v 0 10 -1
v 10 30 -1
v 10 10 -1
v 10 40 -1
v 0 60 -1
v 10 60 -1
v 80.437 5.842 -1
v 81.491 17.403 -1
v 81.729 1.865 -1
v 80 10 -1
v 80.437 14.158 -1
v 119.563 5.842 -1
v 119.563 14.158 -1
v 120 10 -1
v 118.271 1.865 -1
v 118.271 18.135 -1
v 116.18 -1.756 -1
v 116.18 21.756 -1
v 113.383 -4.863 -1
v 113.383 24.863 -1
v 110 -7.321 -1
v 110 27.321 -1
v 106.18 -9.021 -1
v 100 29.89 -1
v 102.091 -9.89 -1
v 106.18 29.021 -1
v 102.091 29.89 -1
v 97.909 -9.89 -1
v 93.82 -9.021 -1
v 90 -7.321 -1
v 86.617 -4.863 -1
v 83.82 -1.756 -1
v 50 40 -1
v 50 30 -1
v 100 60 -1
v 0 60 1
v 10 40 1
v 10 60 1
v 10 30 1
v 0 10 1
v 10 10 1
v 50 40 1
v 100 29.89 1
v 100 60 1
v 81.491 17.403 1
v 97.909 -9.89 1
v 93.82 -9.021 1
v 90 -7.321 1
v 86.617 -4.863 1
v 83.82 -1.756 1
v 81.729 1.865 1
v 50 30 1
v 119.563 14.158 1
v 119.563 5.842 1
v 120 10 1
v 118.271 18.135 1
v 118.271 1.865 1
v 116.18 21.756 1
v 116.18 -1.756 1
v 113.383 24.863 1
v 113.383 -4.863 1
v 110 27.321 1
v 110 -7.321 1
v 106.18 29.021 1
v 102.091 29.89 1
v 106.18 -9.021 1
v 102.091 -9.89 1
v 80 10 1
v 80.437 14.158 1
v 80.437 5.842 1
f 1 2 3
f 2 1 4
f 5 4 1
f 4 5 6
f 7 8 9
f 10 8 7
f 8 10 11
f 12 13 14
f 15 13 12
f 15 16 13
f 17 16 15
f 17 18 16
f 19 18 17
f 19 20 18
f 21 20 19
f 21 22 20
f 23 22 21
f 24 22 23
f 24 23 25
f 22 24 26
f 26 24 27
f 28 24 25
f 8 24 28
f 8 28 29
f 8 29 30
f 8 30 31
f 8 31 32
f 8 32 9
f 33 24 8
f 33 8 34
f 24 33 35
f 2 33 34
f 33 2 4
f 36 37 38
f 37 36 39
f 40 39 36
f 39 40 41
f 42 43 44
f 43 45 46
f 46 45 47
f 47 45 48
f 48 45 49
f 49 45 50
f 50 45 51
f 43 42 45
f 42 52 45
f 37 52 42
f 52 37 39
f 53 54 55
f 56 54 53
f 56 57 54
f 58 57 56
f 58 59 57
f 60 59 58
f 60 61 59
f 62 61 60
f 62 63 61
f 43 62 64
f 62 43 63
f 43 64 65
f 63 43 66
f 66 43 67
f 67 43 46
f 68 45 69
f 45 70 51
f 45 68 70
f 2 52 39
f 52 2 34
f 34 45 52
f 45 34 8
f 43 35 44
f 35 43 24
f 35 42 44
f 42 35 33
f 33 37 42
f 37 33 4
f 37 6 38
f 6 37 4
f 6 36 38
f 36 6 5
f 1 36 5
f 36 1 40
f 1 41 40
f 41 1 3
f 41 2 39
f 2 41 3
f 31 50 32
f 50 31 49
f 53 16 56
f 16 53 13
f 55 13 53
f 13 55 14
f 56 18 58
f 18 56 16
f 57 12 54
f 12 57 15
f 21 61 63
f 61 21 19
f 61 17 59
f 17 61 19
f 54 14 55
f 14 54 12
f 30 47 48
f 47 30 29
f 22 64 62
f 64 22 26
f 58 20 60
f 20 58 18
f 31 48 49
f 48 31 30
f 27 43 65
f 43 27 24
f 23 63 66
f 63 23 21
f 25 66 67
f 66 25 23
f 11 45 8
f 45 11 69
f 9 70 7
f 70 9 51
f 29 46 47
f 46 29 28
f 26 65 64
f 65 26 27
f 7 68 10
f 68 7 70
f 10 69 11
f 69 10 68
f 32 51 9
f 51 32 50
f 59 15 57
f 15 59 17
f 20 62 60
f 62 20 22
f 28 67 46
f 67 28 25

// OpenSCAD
shape = true;
liquid = true;
stiel = true;

zitroneSchale = true;
zitroneInhalt = true;

module glas() {
    polygon(points=[[0,10],[10,10],[10,30],[50,30],[100,10],[100,60],[50,40],[10,40],[10,60],[0,60]]);
};
module glasInhalt() {
    polygon(points=[[50,37],[50,33],[95,15],[95,55]]);
};

module stielInhalt() {
    polygon(points=[[50,37],[50,33],[7,33],[7,57],[2,57],[2,13],[2,57],[2,13],[7,13],[7,37]]);
};


module zitroneInhalt() {

    difference() {
        color("white") cylinder(r=15, h= 2);
    }
};
    
module zitroneSchale() {

    color("yellow") difference() {
        cylinder(r=20, h= 2);
        zitroneInhalt();
    }
}

module liquid() {
    color("red")linear_extrude(height = 2, center = true, convexity = 10, twist = 0) glasInhalt();
}

module stiel() {
    color("white")linear_extrude(height = 2, center = true, convexity = 10, twist = 0) stielInhalt();
}

module shape() {
    color("lightblue") difference() {
        linear_extrude(height = 2, center = true, convexity = 10, twist = 0) glas();
        linear_extrude(height = 2, center = true, convexity = 10, twist = 0) glasInhalt();
        linear_extrude(height = 2, center = true, convexity = 10, twist = 0) stielInhalt();
    }
}

module cocktail() {
    translate([0,0,1])
    union() {
        liquid();
        stiel();
        shape();
    }
}

if (shape) shape();
if (liquid) liquid();
if (stiel) stiel();

//if (zitroneSchale) translate([100,10,-1]) zitroneSchale(); 
//if (zitroneInhalt) translate([100,10,-1]) zitroneInhalt();
    


if (zitroneSchale) difference() {translate([100,10,-1]) zitroneSchale(); shape();}

if (zitroneInhalt) difference() {translate([100,10,-1]) zitroneInhalt(); shape();}
